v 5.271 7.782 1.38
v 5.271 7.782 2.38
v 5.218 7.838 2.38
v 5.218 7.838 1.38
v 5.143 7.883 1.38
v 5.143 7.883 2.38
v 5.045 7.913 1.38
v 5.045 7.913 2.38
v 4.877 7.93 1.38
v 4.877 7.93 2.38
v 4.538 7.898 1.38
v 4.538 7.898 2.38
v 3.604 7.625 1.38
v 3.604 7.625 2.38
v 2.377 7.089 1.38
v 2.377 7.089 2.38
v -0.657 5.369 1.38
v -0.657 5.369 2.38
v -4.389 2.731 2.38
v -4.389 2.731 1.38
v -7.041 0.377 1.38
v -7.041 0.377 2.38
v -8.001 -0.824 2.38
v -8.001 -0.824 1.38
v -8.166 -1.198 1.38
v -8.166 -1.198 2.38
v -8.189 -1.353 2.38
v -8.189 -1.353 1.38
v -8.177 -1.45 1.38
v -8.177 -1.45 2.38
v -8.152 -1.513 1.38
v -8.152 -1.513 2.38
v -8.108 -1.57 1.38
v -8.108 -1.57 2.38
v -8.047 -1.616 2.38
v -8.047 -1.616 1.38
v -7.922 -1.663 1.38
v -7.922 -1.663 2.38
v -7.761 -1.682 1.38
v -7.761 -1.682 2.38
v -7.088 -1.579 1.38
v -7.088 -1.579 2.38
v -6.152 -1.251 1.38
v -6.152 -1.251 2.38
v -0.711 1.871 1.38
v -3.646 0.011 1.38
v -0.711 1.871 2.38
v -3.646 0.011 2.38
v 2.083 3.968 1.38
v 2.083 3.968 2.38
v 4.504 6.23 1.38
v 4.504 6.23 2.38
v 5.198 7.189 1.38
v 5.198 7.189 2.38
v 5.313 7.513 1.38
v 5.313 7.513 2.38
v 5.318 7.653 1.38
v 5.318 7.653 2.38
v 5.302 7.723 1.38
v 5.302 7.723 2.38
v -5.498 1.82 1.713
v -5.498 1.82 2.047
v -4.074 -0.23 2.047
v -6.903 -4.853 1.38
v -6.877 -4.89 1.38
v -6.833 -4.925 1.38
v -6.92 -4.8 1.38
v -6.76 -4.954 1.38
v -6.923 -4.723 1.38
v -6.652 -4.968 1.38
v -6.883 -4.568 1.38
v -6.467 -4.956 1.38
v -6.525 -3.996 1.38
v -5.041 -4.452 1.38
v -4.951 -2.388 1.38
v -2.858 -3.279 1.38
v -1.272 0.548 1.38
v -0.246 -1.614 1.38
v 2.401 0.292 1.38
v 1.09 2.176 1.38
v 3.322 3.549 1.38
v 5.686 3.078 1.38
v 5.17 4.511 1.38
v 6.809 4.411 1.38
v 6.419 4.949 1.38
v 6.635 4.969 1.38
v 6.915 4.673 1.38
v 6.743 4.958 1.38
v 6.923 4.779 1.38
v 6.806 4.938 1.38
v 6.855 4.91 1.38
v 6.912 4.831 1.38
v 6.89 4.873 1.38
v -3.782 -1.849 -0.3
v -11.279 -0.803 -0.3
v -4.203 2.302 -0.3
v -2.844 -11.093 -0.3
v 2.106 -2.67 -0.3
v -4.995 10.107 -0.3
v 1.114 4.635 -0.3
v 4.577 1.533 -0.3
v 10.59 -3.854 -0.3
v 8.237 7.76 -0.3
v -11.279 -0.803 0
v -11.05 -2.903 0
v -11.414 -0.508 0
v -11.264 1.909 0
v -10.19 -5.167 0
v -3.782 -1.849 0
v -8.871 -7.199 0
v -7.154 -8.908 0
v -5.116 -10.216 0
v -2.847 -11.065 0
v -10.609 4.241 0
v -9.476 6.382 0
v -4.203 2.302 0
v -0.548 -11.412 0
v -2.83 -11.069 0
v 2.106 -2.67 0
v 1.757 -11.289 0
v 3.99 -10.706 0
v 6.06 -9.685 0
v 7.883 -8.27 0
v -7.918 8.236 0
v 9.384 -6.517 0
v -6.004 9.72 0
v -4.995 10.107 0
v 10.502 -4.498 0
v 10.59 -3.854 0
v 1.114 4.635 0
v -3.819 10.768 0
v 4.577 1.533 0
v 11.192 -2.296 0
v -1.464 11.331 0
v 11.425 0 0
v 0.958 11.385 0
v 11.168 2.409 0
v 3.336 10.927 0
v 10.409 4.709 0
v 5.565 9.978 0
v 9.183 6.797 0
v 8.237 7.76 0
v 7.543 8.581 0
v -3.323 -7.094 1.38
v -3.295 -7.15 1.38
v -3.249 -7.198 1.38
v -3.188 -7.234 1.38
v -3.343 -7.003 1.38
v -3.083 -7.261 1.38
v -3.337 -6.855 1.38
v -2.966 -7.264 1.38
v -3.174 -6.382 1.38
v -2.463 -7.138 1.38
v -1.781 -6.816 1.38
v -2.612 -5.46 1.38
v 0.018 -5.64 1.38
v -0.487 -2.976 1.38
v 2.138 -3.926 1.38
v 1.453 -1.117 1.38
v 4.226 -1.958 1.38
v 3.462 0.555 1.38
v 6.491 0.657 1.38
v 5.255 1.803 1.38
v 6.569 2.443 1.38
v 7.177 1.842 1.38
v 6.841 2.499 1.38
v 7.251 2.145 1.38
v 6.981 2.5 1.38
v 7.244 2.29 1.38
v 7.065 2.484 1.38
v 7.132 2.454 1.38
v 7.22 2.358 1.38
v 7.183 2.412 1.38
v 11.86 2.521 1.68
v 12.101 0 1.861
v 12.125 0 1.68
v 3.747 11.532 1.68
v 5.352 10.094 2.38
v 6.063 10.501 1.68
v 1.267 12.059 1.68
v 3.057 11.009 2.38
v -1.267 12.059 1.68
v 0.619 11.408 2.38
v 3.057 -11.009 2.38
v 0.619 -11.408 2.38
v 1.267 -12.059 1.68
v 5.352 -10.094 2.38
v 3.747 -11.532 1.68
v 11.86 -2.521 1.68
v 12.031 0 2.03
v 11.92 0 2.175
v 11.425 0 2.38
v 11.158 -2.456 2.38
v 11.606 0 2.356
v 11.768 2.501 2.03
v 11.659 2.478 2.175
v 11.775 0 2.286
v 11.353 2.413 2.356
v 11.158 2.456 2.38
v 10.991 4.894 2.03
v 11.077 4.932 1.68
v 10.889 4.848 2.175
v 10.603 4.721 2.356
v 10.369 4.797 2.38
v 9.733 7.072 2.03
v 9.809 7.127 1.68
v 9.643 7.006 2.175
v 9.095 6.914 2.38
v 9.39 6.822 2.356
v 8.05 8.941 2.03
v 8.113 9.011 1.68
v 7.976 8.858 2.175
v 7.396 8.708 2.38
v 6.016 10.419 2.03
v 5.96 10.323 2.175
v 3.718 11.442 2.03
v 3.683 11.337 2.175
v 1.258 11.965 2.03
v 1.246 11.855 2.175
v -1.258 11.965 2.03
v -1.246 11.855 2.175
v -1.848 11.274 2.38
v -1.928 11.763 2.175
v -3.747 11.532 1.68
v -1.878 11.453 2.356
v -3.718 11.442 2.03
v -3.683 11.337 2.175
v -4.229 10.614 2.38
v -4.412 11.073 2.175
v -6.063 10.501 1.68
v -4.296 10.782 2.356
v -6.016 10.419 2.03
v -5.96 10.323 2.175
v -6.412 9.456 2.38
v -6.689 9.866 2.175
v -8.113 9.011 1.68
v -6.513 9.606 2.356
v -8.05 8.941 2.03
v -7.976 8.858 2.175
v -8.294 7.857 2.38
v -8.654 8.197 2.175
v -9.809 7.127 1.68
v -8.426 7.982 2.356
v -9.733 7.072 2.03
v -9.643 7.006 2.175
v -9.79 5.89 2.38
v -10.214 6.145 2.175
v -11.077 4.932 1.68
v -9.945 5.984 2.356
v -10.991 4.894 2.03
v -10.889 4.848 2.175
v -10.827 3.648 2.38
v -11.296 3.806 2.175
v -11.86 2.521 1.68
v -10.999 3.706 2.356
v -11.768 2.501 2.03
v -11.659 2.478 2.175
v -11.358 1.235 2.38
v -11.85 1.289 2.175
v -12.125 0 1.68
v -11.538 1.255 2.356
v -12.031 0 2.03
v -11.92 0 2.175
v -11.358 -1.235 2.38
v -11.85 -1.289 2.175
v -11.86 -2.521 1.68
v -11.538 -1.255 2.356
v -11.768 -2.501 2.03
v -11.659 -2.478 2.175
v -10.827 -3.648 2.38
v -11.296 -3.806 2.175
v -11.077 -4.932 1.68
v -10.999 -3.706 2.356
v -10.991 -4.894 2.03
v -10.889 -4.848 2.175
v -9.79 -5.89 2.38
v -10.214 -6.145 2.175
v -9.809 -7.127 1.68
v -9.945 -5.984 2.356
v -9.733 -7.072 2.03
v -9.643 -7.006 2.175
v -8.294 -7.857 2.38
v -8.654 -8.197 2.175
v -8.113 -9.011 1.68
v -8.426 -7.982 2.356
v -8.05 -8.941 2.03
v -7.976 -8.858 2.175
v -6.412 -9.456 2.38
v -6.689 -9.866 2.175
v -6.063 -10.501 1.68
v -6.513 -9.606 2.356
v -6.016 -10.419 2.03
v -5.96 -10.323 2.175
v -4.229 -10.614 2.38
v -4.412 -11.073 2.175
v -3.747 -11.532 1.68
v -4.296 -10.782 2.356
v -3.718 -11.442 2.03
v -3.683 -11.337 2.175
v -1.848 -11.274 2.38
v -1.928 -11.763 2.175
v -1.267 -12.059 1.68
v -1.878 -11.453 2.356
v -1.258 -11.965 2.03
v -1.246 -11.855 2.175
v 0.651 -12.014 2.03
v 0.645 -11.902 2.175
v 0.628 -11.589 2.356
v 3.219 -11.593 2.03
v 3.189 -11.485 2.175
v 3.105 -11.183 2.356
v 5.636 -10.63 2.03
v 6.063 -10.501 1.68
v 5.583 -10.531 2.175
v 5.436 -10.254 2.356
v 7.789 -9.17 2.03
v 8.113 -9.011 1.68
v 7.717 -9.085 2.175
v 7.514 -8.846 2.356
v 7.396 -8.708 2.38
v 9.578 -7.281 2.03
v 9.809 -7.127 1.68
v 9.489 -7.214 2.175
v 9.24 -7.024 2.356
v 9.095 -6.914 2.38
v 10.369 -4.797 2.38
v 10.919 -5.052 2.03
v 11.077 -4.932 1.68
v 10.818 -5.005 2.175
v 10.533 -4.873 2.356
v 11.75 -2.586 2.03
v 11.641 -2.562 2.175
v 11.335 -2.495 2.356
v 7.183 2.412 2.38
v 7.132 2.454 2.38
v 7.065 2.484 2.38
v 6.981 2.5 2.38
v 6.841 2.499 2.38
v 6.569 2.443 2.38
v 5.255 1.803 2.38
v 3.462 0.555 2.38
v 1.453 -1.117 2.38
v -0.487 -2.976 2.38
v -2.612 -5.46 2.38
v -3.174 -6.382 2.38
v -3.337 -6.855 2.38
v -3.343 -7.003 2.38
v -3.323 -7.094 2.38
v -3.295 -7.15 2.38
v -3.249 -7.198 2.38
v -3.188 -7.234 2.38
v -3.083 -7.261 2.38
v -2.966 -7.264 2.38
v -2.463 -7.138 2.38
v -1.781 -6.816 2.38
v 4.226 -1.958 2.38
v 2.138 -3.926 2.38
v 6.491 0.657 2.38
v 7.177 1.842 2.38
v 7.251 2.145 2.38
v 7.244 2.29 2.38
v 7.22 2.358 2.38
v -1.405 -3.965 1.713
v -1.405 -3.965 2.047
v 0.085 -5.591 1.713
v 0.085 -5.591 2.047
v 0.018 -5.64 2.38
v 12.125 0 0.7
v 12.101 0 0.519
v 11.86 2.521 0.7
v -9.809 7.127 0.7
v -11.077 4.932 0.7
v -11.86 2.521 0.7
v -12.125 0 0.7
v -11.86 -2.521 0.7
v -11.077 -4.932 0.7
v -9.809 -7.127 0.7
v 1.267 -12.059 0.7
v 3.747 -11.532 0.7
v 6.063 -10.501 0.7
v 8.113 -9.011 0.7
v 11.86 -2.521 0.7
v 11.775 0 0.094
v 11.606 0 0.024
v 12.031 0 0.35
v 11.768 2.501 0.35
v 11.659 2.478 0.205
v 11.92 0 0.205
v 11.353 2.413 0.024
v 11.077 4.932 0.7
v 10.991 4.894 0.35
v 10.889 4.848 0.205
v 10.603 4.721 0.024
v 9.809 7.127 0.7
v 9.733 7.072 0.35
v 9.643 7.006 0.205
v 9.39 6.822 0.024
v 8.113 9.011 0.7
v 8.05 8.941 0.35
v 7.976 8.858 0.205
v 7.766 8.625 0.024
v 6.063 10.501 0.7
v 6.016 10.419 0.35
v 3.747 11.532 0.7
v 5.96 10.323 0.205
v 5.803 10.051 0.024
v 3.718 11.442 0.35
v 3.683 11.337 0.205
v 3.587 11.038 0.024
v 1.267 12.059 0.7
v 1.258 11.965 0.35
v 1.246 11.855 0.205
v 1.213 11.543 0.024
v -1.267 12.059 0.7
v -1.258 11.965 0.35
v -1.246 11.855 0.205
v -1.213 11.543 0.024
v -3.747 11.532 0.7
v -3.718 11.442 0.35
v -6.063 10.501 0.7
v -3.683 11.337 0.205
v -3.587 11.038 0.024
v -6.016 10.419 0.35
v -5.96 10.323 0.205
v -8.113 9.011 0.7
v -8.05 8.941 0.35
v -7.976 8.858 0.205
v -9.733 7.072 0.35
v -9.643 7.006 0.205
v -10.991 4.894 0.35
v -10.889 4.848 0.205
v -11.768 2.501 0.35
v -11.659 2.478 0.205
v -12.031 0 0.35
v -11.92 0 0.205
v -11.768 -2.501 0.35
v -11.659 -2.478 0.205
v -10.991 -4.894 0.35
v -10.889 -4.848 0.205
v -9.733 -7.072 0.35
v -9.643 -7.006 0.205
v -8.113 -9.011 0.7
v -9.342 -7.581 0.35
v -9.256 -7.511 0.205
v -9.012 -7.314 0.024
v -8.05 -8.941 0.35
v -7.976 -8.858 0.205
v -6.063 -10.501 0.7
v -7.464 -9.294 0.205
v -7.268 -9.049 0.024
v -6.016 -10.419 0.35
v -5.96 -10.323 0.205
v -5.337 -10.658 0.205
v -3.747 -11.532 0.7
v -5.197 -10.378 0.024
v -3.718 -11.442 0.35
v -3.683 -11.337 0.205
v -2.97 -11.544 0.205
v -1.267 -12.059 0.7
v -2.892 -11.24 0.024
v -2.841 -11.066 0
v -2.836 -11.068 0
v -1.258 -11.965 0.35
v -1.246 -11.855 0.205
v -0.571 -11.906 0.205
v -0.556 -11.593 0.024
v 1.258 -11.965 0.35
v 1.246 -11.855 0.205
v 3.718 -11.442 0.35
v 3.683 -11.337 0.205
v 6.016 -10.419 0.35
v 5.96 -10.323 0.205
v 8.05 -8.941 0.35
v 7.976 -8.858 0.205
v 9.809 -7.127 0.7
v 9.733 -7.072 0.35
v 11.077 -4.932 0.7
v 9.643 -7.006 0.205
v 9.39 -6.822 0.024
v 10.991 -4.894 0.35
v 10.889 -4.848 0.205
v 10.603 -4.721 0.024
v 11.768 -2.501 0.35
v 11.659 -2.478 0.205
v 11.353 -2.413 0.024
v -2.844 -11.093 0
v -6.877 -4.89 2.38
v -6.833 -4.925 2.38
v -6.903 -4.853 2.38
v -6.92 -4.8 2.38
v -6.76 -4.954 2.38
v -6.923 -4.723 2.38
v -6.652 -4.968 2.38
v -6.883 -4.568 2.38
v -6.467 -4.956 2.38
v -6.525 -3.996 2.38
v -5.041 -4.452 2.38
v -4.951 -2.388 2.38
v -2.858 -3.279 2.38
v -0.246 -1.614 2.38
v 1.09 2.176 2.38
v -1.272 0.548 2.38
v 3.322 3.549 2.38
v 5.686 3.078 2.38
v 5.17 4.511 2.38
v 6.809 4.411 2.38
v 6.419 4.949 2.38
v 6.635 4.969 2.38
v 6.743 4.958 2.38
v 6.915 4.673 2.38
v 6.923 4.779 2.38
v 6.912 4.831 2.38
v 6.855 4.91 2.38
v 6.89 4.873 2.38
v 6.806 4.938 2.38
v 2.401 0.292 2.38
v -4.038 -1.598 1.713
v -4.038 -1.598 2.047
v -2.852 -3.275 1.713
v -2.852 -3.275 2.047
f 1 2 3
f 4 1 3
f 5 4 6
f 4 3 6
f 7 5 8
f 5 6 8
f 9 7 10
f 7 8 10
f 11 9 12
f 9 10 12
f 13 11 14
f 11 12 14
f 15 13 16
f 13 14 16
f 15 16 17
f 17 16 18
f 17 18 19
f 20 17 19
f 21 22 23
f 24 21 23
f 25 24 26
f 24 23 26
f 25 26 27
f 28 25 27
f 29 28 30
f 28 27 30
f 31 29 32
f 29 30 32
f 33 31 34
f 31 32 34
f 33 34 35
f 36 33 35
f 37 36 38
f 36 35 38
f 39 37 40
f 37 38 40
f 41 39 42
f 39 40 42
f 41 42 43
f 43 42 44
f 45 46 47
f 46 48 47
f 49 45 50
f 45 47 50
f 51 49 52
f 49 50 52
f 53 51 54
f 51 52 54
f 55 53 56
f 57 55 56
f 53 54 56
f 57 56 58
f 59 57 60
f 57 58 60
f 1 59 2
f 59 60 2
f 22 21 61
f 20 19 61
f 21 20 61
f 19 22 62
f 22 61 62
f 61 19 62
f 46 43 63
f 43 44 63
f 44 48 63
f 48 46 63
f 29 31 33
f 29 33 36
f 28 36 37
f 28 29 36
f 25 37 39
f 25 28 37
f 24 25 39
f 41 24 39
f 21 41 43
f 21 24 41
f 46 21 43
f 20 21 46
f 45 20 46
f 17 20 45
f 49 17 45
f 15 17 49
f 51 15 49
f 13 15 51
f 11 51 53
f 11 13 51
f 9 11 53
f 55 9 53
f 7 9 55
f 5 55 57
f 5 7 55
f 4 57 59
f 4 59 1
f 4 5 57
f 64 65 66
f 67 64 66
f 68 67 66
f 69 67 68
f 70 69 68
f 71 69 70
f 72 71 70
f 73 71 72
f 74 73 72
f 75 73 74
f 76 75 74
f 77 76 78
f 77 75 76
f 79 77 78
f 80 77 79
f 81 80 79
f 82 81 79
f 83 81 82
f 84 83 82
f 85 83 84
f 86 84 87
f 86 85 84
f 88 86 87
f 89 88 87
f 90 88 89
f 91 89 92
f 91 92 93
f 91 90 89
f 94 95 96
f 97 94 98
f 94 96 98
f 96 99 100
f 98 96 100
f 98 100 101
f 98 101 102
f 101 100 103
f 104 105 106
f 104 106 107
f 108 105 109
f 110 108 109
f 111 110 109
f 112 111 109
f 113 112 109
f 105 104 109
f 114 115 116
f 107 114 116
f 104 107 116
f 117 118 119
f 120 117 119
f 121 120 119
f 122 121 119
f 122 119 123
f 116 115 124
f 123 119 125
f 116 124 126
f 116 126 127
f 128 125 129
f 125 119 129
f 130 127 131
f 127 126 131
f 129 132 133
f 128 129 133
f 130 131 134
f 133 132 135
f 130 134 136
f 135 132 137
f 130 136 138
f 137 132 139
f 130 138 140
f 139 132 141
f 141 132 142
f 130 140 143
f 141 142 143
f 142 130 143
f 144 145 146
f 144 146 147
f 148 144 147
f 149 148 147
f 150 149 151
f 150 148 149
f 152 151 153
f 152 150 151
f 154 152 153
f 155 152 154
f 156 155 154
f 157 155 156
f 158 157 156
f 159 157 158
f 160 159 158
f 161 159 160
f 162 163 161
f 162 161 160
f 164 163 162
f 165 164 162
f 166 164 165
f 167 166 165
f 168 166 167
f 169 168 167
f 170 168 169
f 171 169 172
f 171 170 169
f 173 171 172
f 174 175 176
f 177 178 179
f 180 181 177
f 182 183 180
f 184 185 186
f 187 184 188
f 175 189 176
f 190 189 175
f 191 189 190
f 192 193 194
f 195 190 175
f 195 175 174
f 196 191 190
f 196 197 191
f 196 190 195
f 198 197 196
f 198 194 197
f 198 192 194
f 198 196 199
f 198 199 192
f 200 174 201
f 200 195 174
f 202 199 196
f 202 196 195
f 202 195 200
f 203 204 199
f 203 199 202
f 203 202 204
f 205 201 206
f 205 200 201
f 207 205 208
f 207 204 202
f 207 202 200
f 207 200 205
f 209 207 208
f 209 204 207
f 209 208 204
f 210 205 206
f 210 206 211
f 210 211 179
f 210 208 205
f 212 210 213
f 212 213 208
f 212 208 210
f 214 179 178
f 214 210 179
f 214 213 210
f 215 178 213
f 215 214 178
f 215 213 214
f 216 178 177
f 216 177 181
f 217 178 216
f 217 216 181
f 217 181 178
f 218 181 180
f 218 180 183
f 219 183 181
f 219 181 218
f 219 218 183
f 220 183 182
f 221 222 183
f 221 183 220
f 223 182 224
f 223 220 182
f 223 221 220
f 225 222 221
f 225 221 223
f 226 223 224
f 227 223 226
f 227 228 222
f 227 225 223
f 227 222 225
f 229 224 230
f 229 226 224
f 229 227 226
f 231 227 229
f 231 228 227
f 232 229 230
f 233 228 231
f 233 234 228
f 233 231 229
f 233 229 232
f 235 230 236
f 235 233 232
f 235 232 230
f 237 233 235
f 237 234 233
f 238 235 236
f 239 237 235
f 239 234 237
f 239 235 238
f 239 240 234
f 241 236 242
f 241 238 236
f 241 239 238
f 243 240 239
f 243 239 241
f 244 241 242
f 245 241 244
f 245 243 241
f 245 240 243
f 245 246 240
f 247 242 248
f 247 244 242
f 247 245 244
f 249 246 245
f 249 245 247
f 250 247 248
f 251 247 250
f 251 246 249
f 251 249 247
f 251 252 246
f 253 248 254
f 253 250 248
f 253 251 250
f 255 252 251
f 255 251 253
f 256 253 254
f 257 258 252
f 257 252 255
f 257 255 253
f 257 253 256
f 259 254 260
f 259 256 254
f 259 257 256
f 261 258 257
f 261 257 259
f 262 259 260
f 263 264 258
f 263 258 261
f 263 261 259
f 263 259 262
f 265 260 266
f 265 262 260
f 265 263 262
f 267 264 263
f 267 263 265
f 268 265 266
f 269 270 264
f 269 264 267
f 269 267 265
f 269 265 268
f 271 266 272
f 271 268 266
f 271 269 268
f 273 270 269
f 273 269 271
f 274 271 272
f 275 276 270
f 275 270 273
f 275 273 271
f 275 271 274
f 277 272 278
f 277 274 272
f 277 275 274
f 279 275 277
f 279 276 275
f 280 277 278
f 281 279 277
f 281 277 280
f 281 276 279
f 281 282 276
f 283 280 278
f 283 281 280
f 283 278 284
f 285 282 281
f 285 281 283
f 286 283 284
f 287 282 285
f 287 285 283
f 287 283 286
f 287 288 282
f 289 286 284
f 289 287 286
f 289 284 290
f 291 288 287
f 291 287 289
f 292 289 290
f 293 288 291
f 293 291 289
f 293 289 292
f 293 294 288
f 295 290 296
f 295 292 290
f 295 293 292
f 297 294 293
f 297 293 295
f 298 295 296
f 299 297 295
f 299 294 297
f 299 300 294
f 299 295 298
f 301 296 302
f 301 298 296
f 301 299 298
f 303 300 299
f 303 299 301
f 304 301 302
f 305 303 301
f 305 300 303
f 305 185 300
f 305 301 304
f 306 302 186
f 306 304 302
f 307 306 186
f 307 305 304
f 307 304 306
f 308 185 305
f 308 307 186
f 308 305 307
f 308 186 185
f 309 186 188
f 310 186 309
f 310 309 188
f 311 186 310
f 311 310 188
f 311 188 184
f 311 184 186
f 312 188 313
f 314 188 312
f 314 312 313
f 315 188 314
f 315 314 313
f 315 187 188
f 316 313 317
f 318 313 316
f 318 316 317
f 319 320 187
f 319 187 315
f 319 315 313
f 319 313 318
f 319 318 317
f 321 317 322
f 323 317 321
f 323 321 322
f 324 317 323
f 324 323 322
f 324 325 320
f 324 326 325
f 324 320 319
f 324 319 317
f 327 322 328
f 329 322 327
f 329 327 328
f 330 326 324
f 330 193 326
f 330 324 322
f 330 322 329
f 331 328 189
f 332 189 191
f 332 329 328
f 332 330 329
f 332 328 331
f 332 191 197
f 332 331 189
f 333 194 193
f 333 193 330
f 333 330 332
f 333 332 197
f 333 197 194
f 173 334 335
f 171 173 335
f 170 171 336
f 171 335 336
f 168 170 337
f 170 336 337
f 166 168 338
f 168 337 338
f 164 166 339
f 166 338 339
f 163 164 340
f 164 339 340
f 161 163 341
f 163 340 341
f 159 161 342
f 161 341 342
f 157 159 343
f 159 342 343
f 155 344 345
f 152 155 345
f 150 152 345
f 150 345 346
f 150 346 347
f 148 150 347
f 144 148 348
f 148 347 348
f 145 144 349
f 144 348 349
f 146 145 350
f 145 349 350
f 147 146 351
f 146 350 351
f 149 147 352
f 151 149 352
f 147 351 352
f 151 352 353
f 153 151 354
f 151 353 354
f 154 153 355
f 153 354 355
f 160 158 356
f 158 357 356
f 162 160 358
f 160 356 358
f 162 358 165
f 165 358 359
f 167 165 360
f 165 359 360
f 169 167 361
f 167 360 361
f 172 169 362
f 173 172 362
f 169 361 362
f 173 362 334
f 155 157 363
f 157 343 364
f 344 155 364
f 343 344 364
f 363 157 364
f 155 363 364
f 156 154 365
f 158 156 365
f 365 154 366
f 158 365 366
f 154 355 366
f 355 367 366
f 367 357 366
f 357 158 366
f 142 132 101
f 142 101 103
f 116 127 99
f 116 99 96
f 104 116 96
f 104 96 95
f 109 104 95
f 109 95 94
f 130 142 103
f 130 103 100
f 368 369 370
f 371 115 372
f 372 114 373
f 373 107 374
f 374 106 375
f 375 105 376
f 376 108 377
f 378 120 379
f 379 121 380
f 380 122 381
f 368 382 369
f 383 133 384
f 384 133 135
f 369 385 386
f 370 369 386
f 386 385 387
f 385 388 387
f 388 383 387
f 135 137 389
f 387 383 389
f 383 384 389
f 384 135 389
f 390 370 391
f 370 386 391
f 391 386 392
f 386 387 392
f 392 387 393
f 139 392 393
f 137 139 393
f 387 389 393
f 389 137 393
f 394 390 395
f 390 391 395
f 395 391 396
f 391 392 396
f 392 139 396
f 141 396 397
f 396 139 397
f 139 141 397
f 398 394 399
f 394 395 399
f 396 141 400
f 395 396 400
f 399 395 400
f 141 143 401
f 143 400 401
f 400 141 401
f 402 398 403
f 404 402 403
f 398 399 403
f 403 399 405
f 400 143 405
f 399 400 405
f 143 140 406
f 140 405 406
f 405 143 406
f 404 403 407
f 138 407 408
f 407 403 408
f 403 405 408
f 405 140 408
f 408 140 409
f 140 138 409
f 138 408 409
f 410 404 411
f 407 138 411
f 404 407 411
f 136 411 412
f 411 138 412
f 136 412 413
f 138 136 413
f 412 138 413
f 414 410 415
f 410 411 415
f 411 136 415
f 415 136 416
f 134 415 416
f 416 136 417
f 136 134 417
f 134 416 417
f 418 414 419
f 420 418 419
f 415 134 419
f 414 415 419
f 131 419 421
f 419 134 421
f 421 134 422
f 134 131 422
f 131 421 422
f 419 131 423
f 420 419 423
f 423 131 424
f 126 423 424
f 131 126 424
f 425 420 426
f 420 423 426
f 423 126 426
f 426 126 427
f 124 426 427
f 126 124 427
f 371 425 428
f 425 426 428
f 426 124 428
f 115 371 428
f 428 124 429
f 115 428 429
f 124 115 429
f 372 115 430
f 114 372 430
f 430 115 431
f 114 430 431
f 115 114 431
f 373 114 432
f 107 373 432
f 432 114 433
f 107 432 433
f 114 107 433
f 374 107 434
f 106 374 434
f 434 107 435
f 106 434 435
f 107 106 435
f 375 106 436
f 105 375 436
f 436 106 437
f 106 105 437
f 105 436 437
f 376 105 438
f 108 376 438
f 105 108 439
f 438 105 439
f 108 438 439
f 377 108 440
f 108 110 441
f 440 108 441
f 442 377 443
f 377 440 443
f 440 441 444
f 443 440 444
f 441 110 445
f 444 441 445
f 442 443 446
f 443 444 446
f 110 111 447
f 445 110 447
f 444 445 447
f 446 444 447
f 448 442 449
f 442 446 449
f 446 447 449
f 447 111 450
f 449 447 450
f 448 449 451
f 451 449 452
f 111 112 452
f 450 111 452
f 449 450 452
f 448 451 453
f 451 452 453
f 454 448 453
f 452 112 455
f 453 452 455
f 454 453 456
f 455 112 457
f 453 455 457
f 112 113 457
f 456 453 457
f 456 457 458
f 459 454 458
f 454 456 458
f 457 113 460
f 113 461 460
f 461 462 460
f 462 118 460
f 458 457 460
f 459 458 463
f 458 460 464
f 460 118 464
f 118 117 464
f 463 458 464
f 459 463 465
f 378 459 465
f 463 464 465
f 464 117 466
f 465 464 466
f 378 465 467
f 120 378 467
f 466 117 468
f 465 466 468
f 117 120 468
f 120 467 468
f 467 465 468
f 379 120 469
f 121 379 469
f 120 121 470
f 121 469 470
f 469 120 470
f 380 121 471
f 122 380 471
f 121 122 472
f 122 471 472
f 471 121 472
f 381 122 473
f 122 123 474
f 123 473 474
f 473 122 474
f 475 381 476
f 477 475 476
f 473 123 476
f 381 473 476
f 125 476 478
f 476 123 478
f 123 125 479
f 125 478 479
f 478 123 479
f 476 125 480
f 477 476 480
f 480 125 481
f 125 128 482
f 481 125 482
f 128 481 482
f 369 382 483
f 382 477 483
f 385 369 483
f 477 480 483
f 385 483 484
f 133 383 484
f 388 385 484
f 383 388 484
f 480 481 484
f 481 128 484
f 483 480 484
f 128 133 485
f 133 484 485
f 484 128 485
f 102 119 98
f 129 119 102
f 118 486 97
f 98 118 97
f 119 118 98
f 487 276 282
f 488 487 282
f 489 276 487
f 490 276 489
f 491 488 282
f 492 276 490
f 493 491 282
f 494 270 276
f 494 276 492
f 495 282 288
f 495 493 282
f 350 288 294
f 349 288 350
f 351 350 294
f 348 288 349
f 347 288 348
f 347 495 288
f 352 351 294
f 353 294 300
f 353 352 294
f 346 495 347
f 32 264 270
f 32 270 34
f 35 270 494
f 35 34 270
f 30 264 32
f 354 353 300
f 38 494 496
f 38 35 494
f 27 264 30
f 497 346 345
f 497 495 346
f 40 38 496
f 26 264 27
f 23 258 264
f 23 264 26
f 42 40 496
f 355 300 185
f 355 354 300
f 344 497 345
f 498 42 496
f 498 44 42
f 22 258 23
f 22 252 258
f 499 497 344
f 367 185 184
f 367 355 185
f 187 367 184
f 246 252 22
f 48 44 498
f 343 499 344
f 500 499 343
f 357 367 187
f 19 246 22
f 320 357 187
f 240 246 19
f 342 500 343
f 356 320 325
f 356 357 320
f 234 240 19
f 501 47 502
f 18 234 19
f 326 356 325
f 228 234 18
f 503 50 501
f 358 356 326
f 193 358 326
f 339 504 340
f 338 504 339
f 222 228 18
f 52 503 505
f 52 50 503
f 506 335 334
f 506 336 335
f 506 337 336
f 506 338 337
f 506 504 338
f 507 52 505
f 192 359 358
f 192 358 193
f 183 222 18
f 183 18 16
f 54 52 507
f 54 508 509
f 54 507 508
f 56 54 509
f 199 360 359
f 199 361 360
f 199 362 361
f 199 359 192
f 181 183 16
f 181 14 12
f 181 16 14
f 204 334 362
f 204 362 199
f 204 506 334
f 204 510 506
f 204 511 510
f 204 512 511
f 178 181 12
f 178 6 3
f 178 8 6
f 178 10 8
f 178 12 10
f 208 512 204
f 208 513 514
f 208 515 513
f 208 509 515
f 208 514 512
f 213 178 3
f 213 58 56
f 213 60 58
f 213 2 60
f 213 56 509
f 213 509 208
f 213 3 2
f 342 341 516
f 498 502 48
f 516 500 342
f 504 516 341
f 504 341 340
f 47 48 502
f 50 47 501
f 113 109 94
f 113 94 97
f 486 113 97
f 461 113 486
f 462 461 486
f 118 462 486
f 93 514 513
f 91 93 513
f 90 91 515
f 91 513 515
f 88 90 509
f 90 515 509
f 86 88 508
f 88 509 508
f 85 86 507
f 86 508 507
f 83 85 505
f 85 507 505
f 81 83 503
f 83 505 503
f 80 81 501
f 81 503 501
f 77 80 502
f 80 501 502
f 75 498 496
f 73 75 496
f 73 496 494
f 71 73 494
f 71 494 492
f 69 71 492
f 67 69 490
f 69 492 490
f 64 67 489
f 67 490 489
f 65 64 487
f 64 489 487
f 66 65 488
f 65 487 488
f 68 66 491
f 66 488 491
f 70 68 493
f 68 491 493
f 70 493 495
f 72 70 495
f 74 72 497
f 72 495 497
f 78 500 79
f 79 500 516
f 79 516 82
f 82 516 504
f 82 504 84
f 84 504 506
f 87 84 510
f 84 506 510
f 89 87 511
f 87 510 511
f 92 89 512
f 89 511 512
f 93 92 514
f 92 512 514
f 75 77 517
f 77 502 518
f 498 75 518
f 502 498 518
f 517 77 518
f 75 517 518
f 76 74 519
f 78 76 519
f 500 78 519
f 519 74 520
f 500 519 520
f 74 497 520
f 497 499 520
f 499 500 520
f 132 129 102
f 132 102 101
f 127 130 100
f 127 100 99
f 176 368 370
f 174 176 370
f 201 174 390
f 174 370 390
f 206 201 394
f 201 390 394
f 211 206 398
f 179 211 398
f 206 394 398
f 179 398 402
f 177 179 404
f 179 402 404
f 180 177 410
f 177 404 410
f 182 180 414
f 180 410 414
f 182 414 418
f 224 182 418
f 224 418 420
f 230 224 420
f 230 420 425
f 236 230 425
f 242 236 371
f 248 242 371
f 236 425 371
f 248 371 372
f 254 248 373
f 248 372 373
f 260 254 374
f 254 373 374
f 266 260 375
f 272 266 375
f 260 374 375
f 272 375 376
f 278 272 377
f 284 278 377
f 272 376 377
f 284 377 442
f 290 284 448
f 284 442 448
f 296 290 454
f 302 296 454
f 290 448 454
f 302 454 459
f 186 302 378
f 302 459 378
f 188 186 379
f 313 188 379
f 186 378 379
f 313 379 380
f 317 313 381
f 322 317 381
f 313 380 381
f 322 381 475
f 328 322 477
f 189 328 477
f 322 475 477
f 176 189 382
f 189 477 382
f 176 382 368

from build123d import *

# Parameters (mm, degrees)
F0_R     = 12.125
F1_DEPTH = 2.38
F2_R     = 0.7
F4_DEPTH = 1
F6_DEPTH = 0.3


with BuildPart() as f1:
    # F0 (on Top) → F1 (new body)
    with BuildSketch(Plane.XY):
        Circle(F0_R)
    extrude(amount=F1_DEPTH)

    # F2
    f2_edges = [f1.edges().sort_by_distance(p)[0] for p in [
        (-12.125, 0, 2.38),
        (-12.125, 0, 0),
    ]]
    fillet(f2_edges, radius=F2_R)

    # F3 (on face) → F4 (cut)
    with BuildSketch(Plane.XY.offset(2.38)):
        with BuildLine():
            add(Edge.make_bspline(
                [(5.2712131292, 7.7818746213), (3.8467154222, 9.8322880392), (-5.498151477, 1.820032668), (-14.8430183763, -6.1922227032), (-4.0736537701, -0.2303807499), (6.6957108361, 5.7314612034), (5.2712131292, 7.7818746213)],
                knots=[0, 0, 0, 2.0943951024, 2.0943951024, 4.1887902048, 4.1887902048, 6.2831853072, 6.2831853072, 6.2831853072], degree=2, weights=[1, 0.5, 1, 0.5, 1, 0.5, 1]))
        make_face()
        with BuildLine():
            add(Edge.make_bspline(
                [(6.8904868818, 4.87336865), (5.7039798615, 6.5509784607), (-4.038496951, -1.5978794196), (-13.7809737636, -9.7467372999), (-2.8519899308, -3.2754892303), (8.0769939021, 3.1957588393), (6.8904868818, 4.87336865)],
                knots=[0, 0, 0, 2.0943951024, 2.0943951024, 4.1887902048, 4.1887902048, 6.2831853072, 6.2831853072, 6.2831853072], degree=2, weights=[1, 0.5, 1, 0.5, 1, 0.5, 1]))
        make_face()
        with BuildLine():
            add(Edge.make_bspline(
                [(7.1830839306, 2.4121028949), (5.6929504977, 4.0377029223), (-1.4054138362, -3.9649092469), (-8.5037781701, -11.9675214162), (0.0847195967, -5.5905092743), (8.6732173636, 0.7865028676), (7.1830839306, 2.4121028949)],
                knots=[0, 0, 0, 2.0943951024, 2.0943951024, 4.1887902048, 4.1887902048, 6.2831853072, 6.2831853072, 6.2831853072], degree=2, weights=[1, 0.5, 1, 0.5, 1, 0.5, 1]))
        make_face()
    extrude(amount=-F4_DEPTH, mode=Mode.SUBTRACT)

    # F5 (on Top) → F6 (join)
    with BuildSketch(Plane.XY):
        Polygon((-4.9951509573, 10.1068597287), (-4.203192804, 2.3018257812), (1.1137669508, 4.6346894586), align=None)
        Polygon((1.1137669508, 4.6346894586), (4.5767141132, 1.5326938526), (8.2368152216, 7.7599906363), align=None)
        Polygon((-4.203192804, 2.3018257812), (-3.7820492652, -1.848696067), (2.1063844203, -2.6703255983), (4.5767141132, 1.5326938526), (1.1137669508, 4.6346894586), align=None)
        Polygon((-11.2787885591, -0.8026551805), (-3.7820492652, -1.848696067), (-4.203192804, 2.3018257812), align=None)
        Polygon((4.5767141132, 1.5326938526), (2.1063844203, -2.6703255983), (10.5903381482, -3.8541152608), align=None)
        Polygon((-3.7820492652, -1.848696067), (-2.8440519236, -11.0929990187), (2.1063844203, -2.6703255983), align=None)
    extrude(amount=-F6_DEPTH)


solid = f1.part
